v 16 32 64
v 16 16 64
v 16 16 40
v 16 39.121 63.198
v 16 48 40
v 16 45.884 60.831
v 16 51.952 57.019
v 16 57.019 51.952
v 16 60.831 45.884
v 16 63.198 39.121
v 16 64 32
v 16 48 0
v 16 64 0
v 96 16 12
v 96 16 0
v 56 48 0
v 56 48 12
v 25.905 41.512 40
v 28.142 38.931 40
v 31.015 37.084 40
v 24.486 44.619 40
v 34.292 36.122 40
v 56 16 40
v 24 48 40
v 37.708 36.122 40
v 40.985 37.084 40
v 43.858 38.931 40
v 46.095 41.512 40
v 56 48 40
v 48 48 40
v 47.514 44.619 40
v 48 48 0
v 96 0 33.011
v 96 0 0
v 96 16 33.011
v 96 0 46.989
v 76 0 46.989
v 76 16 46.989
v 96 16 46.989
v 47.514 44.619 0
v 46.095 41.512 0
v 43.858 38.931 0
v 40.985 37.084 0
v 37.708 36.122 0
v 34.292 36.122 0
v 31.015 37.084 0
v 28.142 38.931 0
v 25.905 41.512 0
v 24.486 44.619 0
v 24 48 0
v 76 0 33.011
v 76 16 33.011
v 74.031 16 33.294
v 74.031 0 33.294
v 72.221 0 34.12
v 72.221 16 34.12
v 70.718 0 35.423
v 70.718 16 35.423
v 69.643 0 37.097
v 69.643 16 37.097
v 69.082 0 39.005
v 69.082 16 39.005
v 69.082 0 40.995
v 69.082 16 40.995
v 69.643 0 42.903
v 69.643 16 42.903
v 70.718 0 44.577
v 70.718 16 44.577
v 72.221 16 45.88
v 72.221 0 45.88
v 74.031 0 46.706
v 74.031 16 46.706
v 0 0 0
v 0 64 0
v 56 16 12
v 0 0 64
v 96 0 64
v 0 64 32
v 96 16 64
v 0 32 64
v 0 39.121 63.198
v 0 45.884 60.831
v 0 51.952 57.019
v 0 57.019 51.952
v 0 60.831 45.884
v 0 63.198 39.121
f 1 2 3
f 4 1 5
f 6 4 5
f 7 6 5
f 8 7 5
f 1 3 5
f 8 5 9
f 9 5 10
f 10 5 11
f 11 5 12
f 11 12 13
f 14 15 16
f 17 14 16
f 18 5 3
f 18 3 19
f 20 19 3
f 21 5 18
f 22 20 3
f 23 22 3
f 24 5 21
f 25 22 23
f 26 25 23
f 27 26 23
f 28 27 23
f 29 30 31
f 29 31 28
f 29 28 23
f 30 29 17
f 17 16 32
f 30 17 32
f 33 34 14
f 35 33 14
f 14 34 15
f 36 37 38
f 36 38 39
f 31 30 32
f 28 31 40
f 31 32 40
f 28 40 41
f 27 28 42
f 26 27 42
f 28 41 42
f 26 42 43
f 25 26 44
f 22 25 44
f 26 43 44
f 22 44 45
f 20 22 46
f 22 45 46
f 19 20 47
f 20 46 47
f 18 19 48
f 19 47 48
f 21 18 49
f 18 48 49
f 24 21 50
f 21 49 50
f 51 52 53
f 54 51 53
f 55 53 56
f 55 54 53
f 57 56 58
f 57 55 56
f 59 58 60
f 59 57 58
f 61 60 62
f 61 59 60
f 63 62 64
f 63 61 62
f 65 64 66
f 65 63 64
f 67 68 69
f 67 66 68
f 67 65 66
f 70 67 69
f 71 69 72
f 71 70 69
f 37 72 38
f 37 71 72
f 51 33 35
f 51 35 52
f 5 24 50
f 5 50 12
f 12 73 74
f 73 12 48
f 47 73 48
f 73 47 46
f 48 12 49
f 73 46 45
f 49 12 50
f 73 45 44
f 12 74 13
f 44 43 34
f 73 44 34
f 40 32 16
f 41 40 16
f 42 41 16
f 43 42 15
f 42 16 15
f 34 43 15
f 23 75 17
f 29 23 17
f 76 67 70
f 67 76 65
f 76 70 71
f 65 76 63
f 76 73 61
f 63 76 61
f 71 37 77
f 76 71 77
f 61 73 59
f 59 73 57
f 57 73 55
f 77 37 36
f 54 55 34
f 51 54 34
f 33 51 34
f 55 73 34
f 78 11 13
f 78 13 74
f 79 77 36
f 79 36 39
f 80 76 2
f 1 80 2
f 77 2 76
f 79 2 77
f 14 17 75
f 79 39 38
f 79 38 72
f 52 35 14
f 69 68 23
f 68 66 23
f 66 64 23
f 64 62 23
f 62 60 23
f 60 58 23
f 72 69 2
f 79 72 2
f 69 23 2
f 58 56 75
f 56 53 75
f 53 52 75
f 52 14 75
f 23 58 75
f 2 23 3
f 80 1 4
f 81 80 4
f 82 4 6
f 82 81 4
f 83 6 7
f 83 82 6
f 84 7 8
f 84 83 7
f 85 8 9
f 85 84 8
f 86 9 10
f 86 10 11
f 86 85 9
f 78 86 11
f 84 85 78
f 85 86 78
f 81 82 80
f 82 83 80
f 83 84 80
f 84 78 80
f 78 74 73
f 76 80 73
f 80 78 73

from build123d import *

# Parameters (mm, degrees)
BOSS_EXTRUDE1_DEPTH     = 64
BOSS_EXTRUDE2_DEPTH     = 40
BOSS_EXTRUDE3_DEPTH     = 12
FILLET2_R               = 32
CUT_EXTRUDE1_DEPTH      = 125.963994815
CUT_EXTRUDE1_DEPTH_BACK = 125.963994815


with BuildPart() as part:
    # Sketch1 → Boss-Extrude1 (new body)
    with BuildSketch(Plane.XY):
        Polygon((16, 48), (16, 64), (0, 64), (0, 0), (96, 0), (96, 16), (56, 16), (16, 16), align=None)
    extrude(amount=BOSS_EXTRUDE1_DEPTH)

    # Sketch1<3> → Boss-Extrude2 (add)
    with BuildSketch(Plane.XY):
        with BuildLine():
            Line((24, 48), (16, 48))
            Line((16, 48), (16, 16))
            Line((16, 16), (56, 16))
            Line((56, 16), (56, 48))
            Line((56, 48), (48, 48))
            ThreePointArc((48, 48), (36, 36), (24, 48))
        make_face()
    extrude(amount=BOSS_EXTRUDE2_DEPTH)

    # Sketch1<4> → Boss-Extrude3 (add)
    with BuildSketch(Plane.XY):
        Polygon((56, 48), (56, 16), (96, 16), align=None)
    extrude(amount=BOSS_EXTRUDE3_DEPTH)

    # Fillet2
    fillet2_edges = [part.edges().sort_by_distance(p)[0] for p in [
        (8, 64, 64),
    ]]
    fillet(fillet2_edges, radius=FILLET2_R)

    # Sketch2 → Cut-Extrude1 (cut, two sides: drawn at the far end of the back side and taken through both)
    with BuildSketch(Plane(origin=(0, 16, 0), x_dir=(1, 0, 0), z_dir=(0, 1, 0)).offset(-CUT_EXTRUDE1_DEPTH_BACK)):
        with BuildLine():
            Line((319.765927442, -46.98901929), (96, -46.98901929))
            Line((96, -46.98901929), (76, -46.98901929))
            ThreePointArc((76, -46.98901929), (69.01098071, -40), (76, -33.01098071))
            Line((76, -33.01098071), (96, -33.01098071))
            Line((96, -33.01098071), (319.765927442, -33.01098071))
            Line((319.765927442, -33.01098071), (767.297782327, -33.01098071))
            Line((767.297782327, -33.01098071), (767.297782327, -46.98901929))
            Line((767.297782327, -46.98901929), (319.765927442, -46.98901929))
        make_face()
    extrude(amount=CUT_EXTRUDE1_DEPTH + CUT_EXTRUDE1_DEPTH_BACK, mode=Mode.SUBTRACT)


solid = part.part
